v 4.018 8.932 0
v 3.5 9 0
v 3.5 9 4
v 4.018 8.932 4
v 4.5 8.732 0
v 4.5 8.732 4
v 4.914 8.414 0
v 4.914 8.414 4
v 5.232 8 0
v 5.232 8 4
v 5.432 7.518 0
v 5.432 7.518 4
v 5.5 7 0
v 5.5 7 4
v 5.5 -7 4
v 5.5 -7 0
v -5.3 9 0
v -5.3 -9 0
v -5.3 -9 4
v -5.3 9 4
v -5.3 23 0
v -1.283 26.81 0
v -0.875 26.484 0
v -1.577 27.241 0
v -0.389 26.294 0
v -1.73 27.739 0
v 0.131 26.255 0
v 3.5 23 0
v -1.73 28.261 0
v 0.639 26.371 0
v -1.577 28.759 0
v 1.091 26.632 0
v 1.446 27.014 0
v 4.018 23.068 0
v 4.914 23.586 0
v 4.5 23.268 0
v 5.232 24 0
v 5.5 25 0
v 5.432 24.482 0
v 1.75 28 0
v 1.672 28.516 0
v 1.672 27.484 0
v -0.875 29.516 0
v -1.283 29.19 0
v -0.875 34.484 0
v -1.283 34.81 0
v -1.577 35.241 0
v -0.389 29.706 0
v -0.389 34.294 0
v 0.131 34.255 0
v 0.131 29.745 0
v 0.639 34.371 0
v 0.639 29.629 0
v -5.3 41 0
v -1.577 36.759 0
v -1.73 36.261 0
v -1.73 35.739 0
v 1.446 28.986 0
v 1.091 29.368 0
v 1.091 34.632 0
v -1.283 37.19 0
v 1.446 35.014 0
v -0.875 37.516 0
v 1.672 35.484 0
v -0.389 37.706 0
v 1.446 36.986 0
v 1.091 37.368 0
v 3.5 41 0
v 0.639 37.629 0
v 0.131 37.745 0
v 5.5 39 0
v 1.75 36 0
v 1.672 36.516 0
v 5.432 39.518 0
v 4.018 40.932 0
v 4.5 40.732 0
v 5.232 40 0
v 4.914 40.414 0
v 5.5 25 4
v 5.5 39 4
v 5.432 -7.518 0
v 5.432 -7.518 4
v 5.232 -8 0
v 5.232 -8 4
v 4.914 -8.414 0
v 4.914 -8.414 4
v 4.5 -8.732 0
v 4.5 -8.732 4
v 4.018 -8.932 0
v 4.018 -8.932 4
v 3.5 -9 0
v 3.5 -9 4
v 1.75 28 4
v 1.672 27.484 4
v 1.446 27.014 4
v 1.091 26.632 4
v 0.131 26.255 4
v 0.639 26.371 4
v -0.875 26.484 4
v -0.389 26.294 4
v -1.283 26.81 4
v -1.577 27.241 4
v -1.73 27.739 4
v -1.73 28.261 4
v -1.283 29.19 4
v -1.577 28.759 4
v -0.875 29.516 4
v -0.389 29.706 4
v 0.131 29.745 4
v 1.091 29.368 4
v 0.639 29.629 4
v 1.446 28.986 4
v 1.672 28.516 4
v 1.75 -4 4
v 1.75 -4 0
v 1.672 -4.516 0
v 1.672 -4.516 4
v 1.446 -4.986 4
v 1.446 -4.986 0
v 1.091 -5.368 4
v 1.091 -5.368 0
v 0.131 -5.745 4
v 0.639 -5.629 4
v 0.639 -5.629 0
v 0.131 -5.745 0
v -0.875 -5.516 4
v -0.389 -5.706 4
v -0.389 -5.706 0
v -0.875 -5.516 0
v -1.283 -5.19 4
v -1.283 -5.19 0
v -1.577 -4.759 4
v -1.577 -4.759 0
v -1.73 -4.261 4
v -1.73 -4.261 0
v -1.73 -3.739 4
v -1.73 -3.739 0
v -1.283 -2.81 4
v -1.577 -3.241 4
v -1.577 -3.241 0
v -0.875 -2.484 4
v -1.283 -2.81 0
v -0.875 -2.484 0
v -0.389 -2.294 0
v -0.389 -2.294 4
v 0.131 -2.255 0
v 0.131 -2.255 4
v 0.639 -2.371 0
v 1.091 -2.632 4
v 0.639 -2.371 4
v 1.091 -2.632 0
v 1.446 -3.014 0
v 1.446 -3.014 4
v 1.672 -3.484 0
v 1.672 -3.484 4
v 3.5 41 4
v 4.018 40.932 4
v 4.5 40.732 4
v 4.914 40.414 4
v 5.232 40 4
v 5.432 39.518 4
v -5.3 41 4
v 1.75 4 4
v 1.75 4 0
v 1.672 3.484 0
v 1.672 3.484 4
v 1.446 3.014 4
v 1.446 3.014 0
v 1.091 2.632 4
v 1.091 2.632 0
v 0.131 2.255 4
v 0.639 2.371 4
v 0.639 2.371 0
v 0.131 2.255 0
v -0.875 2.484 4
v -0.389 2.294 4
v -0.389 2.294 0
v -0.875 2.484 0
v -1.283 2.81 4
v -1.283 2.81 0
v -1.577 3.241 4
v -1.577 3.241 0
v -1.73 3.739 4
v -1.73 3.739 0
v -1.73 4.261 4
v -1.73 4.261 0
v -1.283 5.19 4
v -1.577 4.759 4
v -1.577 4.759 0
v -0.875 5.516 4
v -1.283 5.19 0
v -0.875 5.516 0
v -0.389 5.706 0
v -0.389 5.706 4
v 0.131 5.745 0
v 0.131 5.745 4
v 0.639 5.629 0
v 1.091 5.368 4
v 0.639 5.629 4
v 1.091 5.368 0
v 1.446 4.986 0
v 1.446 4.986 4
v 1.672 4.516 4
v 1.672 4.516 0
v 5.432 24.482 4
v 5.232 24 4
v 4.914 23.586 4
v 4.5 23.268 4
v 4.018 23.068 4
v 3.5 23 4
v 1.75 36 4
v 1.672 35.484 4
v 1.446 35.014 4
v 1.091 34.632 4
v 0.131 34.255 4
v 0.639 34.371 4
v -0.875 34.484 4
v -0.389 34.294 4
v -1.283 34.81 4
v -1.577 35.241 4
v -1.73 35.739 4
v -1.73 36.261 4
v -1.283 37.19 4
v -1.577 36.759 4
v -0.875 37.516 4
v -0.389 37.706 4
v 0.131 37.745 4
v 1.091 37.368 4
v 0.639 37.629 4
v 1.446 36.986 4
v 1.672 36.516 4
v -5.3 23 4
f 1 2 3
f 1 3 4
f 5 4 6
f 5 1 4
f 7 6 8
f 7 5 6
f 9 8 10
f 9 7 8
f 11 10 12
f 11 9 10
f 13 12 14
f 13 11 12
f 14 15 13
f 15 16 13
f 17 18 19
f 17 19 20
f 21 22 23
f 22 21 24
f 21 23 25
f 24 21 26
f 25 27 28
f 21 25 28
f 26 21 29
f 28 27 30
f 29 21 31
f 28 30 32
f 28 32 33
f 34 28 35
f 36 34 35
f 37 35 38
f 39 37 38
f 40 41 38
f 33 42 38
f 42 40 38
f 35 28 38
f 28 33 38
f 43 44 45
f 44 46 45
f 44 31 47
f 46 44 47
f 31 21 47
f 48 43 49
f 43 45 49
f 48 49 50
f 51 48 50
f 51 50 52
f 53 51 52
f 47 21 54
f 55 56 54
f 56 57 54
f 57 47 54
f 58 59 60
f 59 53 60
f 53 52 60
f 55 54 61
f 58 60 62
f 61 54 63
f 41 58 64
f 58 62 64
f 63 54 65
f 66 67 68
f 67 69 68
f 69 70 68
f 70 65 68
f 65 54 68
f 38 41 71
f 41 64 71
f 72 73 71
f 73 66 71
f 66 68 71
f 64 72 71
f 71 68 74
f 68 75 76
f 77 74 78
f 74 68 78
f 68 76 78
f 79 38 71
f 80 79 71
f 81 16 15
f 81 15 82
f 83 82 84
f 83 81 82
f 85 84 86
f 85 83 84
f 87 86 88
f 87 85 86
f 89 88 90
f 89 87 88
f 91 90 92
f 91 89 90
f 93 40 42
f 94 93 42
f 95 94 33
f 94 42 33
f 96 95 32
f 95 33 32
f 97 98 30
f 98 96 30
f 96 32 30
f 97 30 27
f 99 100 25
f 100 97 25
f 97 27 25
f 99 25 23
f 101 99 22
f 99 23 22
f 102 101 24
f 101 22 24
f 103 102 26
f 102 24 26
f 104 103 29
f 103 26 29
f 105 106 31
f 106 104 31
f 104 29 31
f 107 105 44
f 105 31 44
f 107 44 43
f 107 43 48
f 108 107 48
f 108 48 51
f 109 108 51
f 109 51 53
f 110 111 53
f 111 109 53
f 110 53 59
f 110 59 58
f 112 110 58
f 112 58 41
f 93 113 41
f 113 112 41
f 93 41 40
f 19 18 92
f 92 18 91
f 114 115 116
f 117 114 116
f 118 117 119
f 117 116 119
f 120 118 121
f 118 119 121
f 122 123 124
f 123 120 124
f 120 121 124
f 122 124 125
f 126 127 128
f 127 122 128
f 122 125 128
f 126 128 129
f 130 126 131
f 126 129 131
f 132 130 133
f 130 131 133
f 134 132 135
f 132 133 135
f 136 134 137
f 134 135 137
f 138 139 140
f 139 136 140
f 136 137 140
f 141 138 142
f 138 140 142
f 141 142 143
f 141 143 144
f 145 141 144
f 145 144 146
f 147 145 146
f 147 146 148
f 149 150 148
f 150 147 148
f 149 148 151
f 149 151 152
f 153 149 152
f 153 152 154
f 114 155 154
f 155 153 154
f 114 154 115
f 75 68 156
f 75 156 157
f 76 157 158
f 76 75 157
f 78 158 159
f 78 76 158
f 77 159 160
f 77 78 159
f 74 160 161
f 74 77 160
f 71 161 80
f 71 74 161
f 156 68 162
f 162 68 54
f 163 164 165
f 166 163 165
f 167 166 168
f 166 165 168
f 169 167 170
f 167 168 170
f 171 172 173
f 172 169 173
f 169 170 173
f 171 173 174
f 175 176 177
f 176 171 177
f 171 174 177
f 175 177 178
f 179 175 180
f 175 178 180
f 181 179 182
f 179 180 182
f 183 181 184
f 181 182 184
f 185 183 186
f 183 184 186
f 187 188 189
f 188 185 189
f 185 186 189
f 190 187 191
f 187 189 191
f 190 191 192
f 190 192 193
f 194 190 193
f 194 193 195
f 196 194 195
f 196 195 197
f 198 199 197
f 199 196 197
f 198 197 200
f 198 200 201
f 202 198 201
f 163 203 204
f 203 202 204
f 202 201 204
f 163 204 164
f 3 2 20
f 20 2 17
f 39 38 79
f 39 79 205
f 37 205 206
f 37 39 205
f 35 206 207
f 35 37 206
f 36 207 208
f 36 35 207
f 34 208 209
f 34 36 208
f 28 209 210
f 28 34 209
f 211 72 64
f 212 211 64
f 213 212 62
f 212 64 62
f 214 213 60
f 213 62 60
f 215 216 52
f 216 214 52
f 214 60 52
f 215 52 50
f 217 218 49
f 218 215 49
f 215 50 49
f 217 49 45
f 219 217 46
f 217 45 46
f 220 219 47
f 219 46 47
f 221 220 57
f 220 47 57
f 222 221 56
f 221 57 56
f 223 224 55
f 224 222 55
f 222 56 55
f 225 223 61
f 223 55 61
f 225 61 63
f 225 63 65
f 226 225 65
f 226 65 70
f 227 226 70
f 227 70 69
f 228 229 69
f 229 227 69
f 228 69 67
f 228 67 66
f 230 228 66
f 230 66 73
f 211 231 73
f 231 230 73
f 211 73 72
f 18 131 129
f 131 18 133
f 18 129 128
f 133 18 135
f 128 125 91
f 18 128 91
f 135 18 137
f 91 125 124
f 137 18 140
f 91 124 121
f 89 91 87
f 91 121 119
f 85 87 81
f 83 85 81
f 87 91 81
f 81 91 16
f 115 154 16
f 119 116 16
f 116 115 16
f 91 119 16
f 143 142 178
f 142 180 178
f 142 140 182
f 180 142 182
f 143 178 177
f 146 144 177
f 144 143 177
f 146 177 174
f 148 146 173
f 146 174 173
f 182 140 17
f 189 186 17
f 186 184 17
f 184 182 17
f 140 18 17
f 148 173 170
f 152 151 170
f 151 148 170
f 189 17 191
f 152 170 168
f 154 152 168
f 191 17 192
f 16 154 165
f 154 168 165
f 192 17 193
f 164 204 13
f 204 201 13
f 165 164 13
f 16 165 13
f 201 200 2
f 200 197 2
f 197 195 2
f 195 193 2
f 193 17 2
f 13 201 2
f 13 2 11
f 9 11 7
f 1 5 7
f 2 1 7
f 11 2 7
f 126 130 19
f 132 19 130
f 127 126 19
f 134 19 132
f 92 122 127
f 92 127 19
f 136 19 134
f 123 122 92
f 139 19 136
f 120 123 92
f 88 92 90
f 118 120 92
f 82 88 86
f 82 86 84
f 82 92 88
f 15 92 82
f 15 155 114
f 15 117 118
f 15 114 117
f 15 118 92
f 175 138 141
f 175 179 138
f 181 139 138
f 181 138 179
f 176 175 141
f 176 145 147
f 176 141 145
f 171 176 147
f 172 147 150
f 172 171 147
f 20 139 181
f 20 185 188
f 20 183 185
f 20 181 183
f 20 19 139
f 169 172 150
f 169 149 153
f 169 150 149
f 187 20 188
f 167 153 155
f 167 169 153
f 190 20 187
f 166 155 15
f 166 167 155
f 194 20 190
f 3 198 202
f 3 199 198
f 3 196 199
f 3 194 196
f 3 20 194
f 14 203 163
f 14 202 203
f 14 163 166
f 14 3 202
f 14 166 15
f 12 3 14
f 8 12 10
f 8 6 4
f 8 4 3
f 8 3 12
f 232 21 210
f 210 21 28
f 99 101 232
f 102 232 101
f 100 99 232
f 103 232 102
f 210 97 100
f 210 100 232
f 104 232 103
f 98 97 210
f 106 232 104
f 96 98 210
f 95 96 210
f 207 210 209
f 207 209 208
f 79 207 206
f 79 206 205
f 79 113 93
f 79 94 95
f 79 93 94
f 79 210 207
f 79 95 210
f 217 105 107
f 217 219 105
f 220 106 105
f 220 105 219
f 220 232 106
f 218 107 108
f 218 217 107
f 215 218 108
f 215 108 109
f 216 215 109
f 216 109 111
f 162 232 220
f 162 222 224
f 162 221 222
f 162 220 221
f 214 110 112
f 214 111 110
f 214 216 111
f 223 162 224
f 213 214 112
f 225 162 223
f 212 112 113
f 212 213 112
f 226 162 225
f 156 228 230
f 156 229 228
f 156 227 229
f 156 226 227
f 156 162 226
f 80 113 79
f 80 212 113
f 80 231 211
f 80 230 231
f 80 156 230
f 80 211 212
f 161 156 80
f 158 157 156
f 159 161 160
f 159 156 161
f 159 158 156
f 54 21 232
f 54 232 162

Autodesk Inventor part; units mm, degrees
ref_plane "YZ Plane" through (0, 0, 0) normal (1, 0, 0) x (0, 1, 0)
ref_plane "XZ Plane" through (0, 0, 0) normal (0, 1, 0) x (-1, 0, 0)
ref_plane "XY Plane" through (0, 0, 0) normal (0, 0, 1) x (1, 0, 0)
sketch "Sketch1" plane through (0, 0, 0) normal (0, 0, 1) x (1, 0, 0)
  arc A0 (5.5, 7) -> (3.5, 9) centre (3.5, 7) ccw projected
  line L0 (3.5, 9) -> (-5.5, 9) projected
  line L1 (-5.5, -9) -> (-5.5, 9) projected
  line L2 (-5.5, -9) -> (3.5, -9) projected
  arc A1 (3.5, -9) -> (5.5, -7) centre (3.5, -7) ccw projected
  line L3 (5.5, -7) -> (5.5, 7) projected
  circle A2 centre (0, 4) radius 2.25 projected
  circle A3 centre (0, -4) radius 2.25 projected
  arc A4 (5.5, 39) -> (3.5, 41) centre (3.5, 39) ccw projected
  line L4 (3.5, 41) -> (-5.5, 41) projected
  line L5 (-5.5, 23) -> (-5.5, 41) projected
  line L6 (-5.5, 23) -> (3.5, 23) projected
  arc A5 (3.5, 23) -> (5.5, 25) centre (3.5, 25) ccw projected
  line L7 (5.5, 25) -> (5.5, 39) projected
  circle A6 centre (0, 36) radius 2.25 projected
  circle A7 centre (0, 28) radius 2.25 projected
  line L8 (-5.3, -9) -> (-5.3, 9)
  line L9 (-5.3, 23) -> (-5.3, 41)
  circle A8 centre (0, -4) radius 1.75
  circle A9 centre (0, 4) radius 1.75
  circle A10 centre (0, 28) radius 1.75
  circle A11 centre (0, 36) radius 1.75
  point P0 (0, 0)
  dimension "d0" = 0.2
  dimension "d1" = 0.2
  dimension "d4" = 3.5
  dimension "d5" = 3.5
  dimension "d6" = 3.5
  dimension "d7" = 3.5
extrude "Extrusion1" add sketch "Sketch1" along normal blind 4 contours L3 A1 L2 L8 L0 A0 | A2 | A3 | L7 A5 L6 L9 L4 A4 | A6 | A7
properties part number "Adapter"
